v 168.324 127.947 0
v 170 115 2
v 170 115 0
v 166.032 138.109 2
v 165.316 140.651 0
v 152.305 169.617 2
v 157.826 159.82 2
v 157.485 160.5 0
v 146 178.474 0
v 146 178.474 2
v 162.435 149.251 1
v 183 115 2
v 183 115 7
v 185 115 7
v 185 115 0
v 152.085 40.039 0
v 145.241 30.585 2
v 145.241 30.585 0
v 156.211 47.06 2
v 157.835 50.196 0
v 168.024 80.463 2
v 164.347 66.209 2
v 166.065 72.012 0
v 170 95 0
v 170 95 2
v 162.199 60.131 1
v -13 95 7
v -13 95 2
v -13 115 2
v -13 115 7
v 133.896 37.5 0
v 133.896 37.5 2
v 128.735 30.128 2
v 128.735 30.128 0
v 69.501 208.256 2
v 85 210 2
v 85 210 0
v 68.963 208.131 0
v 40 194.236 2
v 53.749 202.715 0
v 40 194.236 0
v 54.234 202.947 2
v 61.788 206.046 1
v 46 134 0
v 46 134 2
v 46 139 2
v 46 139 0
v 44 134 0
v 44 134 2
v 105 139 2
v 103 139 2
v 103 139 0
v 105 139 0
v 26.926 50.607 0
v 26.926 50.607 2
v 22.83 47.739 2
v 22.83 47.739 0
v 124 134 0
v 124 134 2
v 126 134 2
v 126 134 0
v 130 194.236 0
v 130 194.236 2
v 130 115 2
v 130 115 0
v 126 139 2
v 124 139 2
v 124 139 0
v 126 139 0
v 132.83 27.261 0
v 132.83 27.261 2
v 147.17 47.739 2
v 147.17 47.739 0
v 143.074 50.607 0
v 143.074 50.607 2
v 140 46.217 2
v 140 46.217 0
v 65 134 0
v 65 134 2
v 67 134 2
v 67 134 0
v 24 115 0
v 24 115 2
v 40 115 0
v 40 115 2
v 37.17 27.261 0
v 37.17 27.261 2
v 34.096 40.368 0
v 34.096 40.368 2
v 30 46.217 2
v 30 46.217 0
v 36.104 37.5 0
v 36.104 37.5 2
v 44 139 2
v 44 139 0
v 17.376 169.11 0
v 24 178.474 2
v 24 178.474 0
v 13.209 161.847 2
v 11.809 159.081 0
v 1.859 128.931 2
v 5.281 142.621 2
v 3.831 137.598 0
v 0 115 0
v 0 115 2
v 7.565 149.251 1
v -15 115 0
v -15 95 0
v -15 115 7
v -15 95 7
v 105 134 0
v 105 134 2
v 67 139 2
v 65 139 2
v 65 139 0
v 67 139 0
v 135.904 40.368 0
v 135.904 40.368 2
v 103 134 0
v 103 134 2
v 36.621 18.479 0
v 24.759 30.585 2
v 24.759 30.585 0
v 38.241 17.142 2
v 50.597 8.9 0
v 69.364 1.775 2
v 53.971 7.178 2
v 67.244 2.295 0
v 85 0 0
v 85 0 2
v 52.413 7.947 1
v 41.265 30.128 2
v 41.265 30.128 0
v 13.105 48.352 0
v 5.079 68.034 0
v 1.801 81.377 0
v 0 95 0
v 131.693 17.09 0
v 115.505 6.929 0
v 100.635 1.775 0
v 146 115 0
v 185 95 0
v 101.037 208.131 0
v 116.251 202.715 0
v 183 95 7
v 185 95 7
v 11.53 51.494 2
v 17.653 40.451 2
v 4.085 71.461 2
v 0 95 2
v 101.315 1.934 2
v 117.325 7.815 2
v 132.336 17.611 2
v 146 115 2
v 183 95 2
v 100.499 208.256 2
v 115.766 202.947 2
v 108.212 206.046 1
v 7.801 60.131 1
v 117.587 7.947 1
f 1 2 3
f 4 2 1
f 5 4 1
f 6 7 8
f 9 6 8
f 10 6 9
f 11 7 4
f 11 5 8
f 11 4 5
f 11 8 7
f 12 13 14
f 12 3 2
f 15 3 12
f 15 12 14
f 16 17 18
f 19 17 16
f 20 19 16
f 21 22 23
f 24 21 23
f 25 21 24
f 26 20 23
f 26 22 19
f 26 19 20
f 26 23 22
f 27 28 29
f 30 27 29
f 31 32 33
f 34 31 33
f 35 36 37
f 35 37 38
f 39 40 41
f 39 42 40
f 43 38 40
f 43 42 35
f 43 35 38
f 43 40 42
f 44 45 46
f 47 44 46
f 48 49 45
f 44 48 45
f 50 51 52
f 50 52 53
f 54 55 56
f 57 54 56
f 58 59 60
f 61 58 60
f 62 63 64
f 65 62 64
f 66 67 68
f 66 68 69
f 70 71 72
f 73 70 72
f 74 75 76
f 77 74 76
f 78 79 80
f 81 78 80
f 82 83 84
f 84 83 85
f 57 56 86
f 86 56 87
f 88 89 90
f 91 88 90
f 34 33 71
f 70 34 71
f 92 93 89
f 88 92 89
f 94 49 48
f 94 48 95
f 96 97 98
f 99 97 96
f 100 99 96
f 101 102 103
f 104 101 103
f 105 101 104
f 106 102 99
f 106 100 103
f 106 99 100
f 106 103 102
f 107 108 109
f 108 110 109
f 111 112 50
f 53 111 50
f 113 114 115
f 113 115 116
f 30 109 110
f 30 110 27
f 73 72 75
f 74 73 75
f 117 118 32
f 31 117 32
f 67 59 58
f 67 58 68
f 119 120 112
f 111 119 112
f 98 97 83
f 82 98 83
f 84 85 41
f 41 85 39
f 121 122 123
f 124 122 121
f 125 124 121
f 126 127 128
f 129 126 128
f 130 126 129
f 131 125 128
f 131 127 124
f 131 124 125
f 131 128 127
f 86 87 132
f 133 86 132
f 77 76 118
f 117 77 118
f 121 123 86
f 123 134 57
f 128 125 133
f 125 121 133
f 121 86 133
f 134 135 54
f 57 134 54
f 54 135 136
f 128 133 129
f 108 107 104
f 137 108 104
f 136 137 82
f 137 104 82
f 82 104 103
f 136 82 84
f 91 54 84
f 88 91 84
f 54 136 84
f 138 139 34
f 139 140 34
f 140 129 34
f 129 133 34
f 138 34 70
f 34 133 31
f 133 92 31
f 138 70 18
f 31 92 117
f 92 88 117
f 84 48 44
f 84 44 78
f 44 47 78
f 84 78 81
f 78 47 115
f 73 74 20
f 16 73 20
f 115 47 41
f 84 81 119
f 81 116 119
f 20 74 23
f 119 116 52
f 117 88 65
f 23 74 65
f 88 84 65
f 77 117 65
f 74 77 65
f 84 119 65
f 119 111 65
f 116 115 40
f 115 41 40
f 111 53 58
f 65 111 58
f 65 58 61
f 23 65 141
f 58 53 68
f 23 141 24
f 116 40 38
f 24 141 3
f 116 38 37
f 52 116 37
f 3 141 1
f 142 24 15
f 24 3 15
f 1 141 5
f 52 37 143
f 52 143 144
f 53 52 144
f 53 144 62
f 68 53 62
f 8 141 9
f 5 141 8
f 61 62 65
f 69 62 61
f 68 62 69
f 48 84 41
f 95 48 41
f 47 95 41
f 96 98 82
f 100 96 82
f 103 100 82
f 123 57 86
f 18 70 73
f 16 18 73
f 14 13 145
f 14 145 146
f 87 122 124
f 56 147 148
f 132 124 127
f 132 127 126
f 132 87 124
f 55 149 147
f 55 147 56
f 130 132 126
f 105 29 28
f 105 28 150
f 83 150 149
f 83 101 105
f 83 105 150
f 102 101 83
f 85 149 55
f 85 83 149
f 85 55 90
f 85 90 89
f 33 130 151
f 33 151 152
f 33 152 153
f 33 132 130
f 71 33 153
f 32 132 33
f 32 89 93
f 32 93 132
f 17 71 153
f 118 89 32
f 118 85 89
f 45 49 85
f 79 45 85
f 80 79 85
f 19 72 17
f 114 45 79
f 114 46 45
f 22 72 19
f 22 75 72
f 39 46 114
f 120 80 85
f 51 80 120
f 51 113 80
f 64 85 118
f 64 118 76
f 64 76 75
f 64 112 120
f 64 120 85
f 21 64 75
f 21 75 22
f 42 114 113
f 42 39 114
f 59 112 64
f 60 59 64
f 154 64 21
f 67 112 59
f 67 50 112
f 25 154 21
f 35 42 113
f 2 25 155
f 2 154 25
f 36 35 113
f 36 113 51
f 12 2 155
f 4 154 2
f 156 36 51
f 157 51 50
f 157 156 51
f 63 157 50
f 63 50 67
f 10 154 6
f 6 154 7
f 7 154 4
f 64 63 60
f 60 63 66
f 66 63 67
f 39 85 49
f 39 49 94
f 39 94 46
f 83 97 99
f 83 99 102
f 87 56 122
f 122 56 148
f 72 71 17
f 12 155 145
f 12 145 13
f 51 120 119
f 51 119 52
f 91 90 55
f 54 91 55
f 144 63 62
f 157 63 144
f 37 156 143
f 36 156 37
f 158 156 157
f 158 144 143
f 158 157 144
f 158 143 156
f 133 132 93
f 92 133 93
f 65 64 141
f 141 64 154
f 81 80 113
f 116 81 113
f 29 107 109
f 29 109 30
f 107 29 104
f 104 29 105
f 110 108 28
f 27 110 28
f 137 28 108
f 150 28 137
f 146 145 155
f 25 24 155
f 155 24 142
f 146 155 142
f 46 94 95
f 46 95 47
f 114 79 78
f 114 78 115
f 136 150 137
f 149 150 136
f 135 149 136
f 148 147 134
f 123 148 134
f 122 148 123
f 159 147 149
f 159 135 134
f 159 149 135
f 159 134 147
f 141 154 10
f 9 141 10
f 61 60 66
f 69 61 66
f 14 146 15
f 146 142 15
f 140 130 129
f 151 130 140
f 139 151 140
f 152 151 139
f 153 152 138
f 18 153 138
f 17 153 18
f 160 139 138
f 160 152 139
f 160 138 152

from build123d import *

# Parameters (mm, degrees)
F0_W      = 170
F0_H      = 210
F1_DEPTH  = 2
F2_W      = 15
F2_H      = 20
F3_DEPTH  = 2
F4_W      = 2
F4_H      = 20
F5_DEPTH  = 5
F7_DEPTH  = 2.001
F9_DEPTH  = 2.0010001
F11_DEPTH = 2.0010001
F12_W     = 2
F12_H     = 5
F13_DEPTH = 2.0010001


with BuildPart() as f1:
    # F0 (on Top) → F1 (new body)
    with BuildSketch(Plane.XY):
        with Locations((85, 105)):
            Rectangle(F0_W, F0_H)
    extrude(amount=F1_DEPTH)

    # F2 (on face) → F3 (join)
    with BuildSketch(Plane.XY.offset(2)):
        with Locations((-7.5, 105)):
            Rectangle(F2_W, F2_H)
        with Locations((177.5, 105)):
            Rectangle(F2_W, F2_H)
    extrude(amount=-F3_DEPTH)

    # F4 (on face) → F5 (join)
    with BuildSketch(Plane.XY.offset(2)):
        with Locations((184, 105)):
            Rectangle(F4_W, F4_H)
        with Locations((-14, 105)):
            Rectangle(F4_W, F4_H)
    extrude(amount=F5_DEPTH)

    # F6 (on face) → F7 (cut, through all)
    with BuildSketch(Plane.XY.offset(2)):
        with BuildLine():
            add(Edge.make_bspline(
                [(24.7591678446, 179.4151456037), (2.9330243604, 152.697989574), (0, 115)],
                knots=[3.9247129048, 3.9247129048, 3.9247129048, 4.6170063214, 4.6170063214, 4.6170063214], degree=2, weights=[1, 0.940687021, 1]))
            Line((24.7591678446, 179.4151456037), (0, 210))
            Line((0, 210), (0, 115))
        make_face()
        with BuildLine():
            add(Edge.make_bspline(
                [(85, 210), (49.7449642279, 210), (24.7591678446, 179.4151456037)],
                knots=[3.1415926536, 3.1415926536, 3.1415926536, 3.9247129048, 3.9247129048, 3.9247129048], degree=2, weights=[1, 0.9243147928, 1]))
            Line((85, 210), (0, 210))
            Line((0, 210), (24.7591678446, 179.4151456037))
        make_face()
        with BuildLine():
            add(Edge.make_bspline(
                [(145.2408321554, 179.4151456037), (120.2550357721, 210), (85, 210)],
                knots=[2.3584724024, 2.3584724024, 2.3584724024, 3.1415926536, 3.1415926536, 3.1415926536], degree=2, weights=[1, 0.9243147928, 1]))
            Line((145.2408321554, 179.4151456037), (170, 210))
            Line((170, 210), (85, 210))
        make_face()
        with BuildLine():
            add(Edge.make_bspline(
                [(170, 115), (167.0669756396, 152.697989574), (145.2408321554, 179.4151456037)],
                knots=[1.6661789858, 1.6661789858, 1.6661789858, 2.3584724024, 2.3584724024, 2.3584724024], degree=2, weights=[1, 0.940687021, 1]))
            Line((170, 115), (170, 210))
            Line((170, 210), (145.2408321554, 179.4151456037))
        make_face()
        with BuildLine():
            Line((0, 0), (24.7591678446, 30.5848543963))
            add(Edge.make_bspline(
                [(0, 95), (2.9330243604, 57.302010426), (24.7591678446, 30.5848543963)],
                knots=[4.8077716394, 4.8077716394, 4.8077716394, 5.500065056, 5.500065056, 5.500065056], degree=2, weights=[1, 0.940687021, 1]))
            Line((0, 95), (0, 0))
        make_face()
        with BuildLine():
            Line((0, 0), (85, 0))
            add(Edge.make_bspline(
                [(24.7591678446, 30.5848543963), (49.7449642279, 0), (85, 0)],
                knots=[5.500065056, 5.500065056, 5.500065056, 6.2831853072, 6.2831853072, 6.2831853072], degree=2, weights=[1, 0.9243147928, 1]))
            Line((24.7591678446, 30.5848543963), (0, 0))
        make_face()
        with BuildLine():
            Line((170, 0), (145.2408321554, 30.5848543963))
            add(Edge.make_bspline(
                [(85, 0), (120.2550357721, 0), (145.2408321554, 30.5848543963)],
                knots=[0, 0, 0, 0.7831202512, 0.7831202512, 0.7831202512], degree=2, weights=[1, 0.9243147928, 1]))
            Line((85, 0), (170, 0))
        make_face()
        with BuildLine():
            Line((170, 0), (170, 95))
            add(Edge.make_bspline(
                [(145.2408321554, 30.5848543963), (167.0669756396, 57.302010426), (170, 95)],
                knots=[0.7831202512, 0.7831202512, 0.7831202512, 1.4754136678, 1.4754136678, 1.4754136678], degree=2, weights=[1, 0.940687021, 1]))
            Line((145.2408321554, 30.5848543963), (170, 0))
        make_face()
    extrude(amount=-F7_DEPTH, mode=Mode.SUBTRACT)

    # F8 (on face) → F9 (cut, through all)
    with BuildSketch(Plane.XY.offset(2)):
        Polygon((140, 37.5), (133.8961270562, 37.5), (128.7345343242, 30.1284816281), (132.8302945456, 27.2605994464), align=None)
        Polygon((135.9042397786, 40.3678821818), (133.8961270562, 37.5), (140, 37.5), align=None)
        Polygon((140, 37.5), (140, 46.2172339781), (135.9042397786, 40.3678821818), align=None)
        Polygon((143.0739452329, 50.6072827354), (140, 46.2172339781), (140, 37.5), (147.1697054544, 47.7394005536), align=None)
        Polygon((36.1038729438, 37.5), (30, 37.5), (37.1697054544, 27.2605994464), (41.2654656758, 30.1284816281), align=None)
        Polygon((34.0957602214, 40.3678821818), (30, 37.5), (36.1038729438, 37.5), align=None)
        Polygon((34.0957602214, 40.3678821818), (30, 46.2172339781), (30, 37.5), align=None)
        Polygon((30, 37.5), (30, 46.2172339781), (26.9260547671, 50.6072827354), (22.8302945456, 47.7394005536), align=None)
    extrude(amount=-F9_DEPTH, mode=Mode.SUBTRACT)

    # F10 (on face) → F11 (cut, through all)
    with BuildSketch(Plane.XY.offset(2)):
        with BuildLine():
            Line((135.1302650927, 190), (130, 190))
            Line((130, 190), (130, 115))
            Line((130, 115), (146, 115))
            Line((146, 115), (146, 178.4740497466))
            add(Edge.make_bspline(
                [(135.1302650927, 190), (137.306371465, 188.0593608414), (139.4104340586, 186.0222842528), (141.4370654471, 183.8965010357), (143.381737679, 181.6908438843), (145.3934634846, 179.2283111754), (145.5457000719, 179.0407818641), (145.6975377618, 178.8525601554), (145.8489724333, 178.6636485868), (146, 178.4740497466)],
                knots=[2.9839924319, 2.9839924319, 2.9839924319, 2.9839924319, 2.9839924319, 2.9839924319, 3.1415926536, 3.1415926536, 3.1415926536, 3.1415926536, 3.154531604, 3.154531604, 3.154531604, 3.154531604, 3.154531604, 3.154531604], degree=5, weights=[0.999407942, 0.9995850974, 0.9997589565, 0.999907202, 1, 1, 0.9999995139, 0.9999985599, 0.9999971556, 0.9999953185]))
        make_face()
        with BuildLine():
            Line((40, 190), (34.8697349073, 190))
            add(Edge.make_bspline(
                [(24, 178.4740497466), (24.1510275667, 178.6636485868), (24.3024622382, 178.8525601554), (24.4542999281, 179.0407818641), (24.6065365154, 179.2283111754), (26.618262321, 181.6908438843), (28.5629345529, 183.8965010357), (30.5895659414, 186.0222842528), (32.693628535, 188.0593608414), (34.8697349073, 190)],
                knots=[4.6041400787, 4.6041400787, 4.6041400787, 4.6041400787, 4.6041400787, 4.6041400787, 4.6170063214, 4.6170063214, 4.6170063214, 4.6170063214, 4.773720941, 4.773720941, 4.773720941, 4.773720941, 4.773720941, 4.773720941], degree=5, weights=[0.9999953185, 0.9999971556, 0.9999985599, 0.9999995139, 1, 1, 0.999907202, 0.9997589565, 0.9995850974, 0.999407942]))
            Line((24, 178.4740497466), (24, 115))
            Line((24, 115), (40, 115))
            Line((40, 115), (40, 190))
        make_face()
        with BuildLine():
            add(Edge.make_bspline(
                [(34.8697349073, 190), (35.8666495511, 190.8890427509), (36.8786886023, 191.7578499358), (37.9053142385, 192.6056593139), (38.9459535543, 193.4317626189), (40, 194.2355073866)],
                knots=[4.773720941, 4.773720941, 4.773720941, 4.773720941, 4.773720941, 4.773720941, 4.8454962601, 4.8454962601, 4.8454962601, 4.8454962601, 4.8454962601, 4.8454962601], degree=5, weights=[0.999407942, 0.9993268048, 0.9992449761, 0.9991646, 0.9990874899, 0.9990151282]))
            Line((34.8697349073, 190), (40, 190))
            Line((40, 190), (40, 194.2355073866))
        make_face()
        with BuildLine():
            add(Edge.make_bspline(
                [(130, 194.2355073866), (131.0540464457, 193.4317626189), (132.0946857615, 192.6056593139), (133.1213113977, 191.7578499358), (134.1333504489, 190.8890427509), (135.1302650927, 190)],
                knots=[2.911811507, 2.911811507, 2.911811507, 2.911811507, 2.911811507, 2.911811507, 2.9839924319, 2.9839924319, 2.9839924319, 2.9839924319, 2.9839924319, 2.9839924319], degree=5, weights=[0.9990151282, 0.9990874899, 0.9991646, 0.9992449761, 0.9993268048, 0.999407942]))
            Line((130, 194.2355073866), (130, 190))
            Line((130, 190), (135.1302650927, 190))
        make_face()
    extrude(amount=-F11_DEPTH, mode=Mode.SUBTRACT)

    # F12 (on face) → F13 (cut, through all)
    with BuildSketch(Plane.XY.offset(2)):
        with Locations((45, 136.5)):
            Rectangle(F12_W, F12_H)
        with Locations((66, 136.5)):
            Rectangle(F12_W, F12_H)
        with Locations((104, 136.5)):
            Rectangle(F12_W, F12_H)
        with Locations((125, 136.5)):
            Rectangle(F12_W, F12_H)
    extrude(amount=-F13_DEPTH, mode=Mode.SUBTRACT)


solid = f1.part
